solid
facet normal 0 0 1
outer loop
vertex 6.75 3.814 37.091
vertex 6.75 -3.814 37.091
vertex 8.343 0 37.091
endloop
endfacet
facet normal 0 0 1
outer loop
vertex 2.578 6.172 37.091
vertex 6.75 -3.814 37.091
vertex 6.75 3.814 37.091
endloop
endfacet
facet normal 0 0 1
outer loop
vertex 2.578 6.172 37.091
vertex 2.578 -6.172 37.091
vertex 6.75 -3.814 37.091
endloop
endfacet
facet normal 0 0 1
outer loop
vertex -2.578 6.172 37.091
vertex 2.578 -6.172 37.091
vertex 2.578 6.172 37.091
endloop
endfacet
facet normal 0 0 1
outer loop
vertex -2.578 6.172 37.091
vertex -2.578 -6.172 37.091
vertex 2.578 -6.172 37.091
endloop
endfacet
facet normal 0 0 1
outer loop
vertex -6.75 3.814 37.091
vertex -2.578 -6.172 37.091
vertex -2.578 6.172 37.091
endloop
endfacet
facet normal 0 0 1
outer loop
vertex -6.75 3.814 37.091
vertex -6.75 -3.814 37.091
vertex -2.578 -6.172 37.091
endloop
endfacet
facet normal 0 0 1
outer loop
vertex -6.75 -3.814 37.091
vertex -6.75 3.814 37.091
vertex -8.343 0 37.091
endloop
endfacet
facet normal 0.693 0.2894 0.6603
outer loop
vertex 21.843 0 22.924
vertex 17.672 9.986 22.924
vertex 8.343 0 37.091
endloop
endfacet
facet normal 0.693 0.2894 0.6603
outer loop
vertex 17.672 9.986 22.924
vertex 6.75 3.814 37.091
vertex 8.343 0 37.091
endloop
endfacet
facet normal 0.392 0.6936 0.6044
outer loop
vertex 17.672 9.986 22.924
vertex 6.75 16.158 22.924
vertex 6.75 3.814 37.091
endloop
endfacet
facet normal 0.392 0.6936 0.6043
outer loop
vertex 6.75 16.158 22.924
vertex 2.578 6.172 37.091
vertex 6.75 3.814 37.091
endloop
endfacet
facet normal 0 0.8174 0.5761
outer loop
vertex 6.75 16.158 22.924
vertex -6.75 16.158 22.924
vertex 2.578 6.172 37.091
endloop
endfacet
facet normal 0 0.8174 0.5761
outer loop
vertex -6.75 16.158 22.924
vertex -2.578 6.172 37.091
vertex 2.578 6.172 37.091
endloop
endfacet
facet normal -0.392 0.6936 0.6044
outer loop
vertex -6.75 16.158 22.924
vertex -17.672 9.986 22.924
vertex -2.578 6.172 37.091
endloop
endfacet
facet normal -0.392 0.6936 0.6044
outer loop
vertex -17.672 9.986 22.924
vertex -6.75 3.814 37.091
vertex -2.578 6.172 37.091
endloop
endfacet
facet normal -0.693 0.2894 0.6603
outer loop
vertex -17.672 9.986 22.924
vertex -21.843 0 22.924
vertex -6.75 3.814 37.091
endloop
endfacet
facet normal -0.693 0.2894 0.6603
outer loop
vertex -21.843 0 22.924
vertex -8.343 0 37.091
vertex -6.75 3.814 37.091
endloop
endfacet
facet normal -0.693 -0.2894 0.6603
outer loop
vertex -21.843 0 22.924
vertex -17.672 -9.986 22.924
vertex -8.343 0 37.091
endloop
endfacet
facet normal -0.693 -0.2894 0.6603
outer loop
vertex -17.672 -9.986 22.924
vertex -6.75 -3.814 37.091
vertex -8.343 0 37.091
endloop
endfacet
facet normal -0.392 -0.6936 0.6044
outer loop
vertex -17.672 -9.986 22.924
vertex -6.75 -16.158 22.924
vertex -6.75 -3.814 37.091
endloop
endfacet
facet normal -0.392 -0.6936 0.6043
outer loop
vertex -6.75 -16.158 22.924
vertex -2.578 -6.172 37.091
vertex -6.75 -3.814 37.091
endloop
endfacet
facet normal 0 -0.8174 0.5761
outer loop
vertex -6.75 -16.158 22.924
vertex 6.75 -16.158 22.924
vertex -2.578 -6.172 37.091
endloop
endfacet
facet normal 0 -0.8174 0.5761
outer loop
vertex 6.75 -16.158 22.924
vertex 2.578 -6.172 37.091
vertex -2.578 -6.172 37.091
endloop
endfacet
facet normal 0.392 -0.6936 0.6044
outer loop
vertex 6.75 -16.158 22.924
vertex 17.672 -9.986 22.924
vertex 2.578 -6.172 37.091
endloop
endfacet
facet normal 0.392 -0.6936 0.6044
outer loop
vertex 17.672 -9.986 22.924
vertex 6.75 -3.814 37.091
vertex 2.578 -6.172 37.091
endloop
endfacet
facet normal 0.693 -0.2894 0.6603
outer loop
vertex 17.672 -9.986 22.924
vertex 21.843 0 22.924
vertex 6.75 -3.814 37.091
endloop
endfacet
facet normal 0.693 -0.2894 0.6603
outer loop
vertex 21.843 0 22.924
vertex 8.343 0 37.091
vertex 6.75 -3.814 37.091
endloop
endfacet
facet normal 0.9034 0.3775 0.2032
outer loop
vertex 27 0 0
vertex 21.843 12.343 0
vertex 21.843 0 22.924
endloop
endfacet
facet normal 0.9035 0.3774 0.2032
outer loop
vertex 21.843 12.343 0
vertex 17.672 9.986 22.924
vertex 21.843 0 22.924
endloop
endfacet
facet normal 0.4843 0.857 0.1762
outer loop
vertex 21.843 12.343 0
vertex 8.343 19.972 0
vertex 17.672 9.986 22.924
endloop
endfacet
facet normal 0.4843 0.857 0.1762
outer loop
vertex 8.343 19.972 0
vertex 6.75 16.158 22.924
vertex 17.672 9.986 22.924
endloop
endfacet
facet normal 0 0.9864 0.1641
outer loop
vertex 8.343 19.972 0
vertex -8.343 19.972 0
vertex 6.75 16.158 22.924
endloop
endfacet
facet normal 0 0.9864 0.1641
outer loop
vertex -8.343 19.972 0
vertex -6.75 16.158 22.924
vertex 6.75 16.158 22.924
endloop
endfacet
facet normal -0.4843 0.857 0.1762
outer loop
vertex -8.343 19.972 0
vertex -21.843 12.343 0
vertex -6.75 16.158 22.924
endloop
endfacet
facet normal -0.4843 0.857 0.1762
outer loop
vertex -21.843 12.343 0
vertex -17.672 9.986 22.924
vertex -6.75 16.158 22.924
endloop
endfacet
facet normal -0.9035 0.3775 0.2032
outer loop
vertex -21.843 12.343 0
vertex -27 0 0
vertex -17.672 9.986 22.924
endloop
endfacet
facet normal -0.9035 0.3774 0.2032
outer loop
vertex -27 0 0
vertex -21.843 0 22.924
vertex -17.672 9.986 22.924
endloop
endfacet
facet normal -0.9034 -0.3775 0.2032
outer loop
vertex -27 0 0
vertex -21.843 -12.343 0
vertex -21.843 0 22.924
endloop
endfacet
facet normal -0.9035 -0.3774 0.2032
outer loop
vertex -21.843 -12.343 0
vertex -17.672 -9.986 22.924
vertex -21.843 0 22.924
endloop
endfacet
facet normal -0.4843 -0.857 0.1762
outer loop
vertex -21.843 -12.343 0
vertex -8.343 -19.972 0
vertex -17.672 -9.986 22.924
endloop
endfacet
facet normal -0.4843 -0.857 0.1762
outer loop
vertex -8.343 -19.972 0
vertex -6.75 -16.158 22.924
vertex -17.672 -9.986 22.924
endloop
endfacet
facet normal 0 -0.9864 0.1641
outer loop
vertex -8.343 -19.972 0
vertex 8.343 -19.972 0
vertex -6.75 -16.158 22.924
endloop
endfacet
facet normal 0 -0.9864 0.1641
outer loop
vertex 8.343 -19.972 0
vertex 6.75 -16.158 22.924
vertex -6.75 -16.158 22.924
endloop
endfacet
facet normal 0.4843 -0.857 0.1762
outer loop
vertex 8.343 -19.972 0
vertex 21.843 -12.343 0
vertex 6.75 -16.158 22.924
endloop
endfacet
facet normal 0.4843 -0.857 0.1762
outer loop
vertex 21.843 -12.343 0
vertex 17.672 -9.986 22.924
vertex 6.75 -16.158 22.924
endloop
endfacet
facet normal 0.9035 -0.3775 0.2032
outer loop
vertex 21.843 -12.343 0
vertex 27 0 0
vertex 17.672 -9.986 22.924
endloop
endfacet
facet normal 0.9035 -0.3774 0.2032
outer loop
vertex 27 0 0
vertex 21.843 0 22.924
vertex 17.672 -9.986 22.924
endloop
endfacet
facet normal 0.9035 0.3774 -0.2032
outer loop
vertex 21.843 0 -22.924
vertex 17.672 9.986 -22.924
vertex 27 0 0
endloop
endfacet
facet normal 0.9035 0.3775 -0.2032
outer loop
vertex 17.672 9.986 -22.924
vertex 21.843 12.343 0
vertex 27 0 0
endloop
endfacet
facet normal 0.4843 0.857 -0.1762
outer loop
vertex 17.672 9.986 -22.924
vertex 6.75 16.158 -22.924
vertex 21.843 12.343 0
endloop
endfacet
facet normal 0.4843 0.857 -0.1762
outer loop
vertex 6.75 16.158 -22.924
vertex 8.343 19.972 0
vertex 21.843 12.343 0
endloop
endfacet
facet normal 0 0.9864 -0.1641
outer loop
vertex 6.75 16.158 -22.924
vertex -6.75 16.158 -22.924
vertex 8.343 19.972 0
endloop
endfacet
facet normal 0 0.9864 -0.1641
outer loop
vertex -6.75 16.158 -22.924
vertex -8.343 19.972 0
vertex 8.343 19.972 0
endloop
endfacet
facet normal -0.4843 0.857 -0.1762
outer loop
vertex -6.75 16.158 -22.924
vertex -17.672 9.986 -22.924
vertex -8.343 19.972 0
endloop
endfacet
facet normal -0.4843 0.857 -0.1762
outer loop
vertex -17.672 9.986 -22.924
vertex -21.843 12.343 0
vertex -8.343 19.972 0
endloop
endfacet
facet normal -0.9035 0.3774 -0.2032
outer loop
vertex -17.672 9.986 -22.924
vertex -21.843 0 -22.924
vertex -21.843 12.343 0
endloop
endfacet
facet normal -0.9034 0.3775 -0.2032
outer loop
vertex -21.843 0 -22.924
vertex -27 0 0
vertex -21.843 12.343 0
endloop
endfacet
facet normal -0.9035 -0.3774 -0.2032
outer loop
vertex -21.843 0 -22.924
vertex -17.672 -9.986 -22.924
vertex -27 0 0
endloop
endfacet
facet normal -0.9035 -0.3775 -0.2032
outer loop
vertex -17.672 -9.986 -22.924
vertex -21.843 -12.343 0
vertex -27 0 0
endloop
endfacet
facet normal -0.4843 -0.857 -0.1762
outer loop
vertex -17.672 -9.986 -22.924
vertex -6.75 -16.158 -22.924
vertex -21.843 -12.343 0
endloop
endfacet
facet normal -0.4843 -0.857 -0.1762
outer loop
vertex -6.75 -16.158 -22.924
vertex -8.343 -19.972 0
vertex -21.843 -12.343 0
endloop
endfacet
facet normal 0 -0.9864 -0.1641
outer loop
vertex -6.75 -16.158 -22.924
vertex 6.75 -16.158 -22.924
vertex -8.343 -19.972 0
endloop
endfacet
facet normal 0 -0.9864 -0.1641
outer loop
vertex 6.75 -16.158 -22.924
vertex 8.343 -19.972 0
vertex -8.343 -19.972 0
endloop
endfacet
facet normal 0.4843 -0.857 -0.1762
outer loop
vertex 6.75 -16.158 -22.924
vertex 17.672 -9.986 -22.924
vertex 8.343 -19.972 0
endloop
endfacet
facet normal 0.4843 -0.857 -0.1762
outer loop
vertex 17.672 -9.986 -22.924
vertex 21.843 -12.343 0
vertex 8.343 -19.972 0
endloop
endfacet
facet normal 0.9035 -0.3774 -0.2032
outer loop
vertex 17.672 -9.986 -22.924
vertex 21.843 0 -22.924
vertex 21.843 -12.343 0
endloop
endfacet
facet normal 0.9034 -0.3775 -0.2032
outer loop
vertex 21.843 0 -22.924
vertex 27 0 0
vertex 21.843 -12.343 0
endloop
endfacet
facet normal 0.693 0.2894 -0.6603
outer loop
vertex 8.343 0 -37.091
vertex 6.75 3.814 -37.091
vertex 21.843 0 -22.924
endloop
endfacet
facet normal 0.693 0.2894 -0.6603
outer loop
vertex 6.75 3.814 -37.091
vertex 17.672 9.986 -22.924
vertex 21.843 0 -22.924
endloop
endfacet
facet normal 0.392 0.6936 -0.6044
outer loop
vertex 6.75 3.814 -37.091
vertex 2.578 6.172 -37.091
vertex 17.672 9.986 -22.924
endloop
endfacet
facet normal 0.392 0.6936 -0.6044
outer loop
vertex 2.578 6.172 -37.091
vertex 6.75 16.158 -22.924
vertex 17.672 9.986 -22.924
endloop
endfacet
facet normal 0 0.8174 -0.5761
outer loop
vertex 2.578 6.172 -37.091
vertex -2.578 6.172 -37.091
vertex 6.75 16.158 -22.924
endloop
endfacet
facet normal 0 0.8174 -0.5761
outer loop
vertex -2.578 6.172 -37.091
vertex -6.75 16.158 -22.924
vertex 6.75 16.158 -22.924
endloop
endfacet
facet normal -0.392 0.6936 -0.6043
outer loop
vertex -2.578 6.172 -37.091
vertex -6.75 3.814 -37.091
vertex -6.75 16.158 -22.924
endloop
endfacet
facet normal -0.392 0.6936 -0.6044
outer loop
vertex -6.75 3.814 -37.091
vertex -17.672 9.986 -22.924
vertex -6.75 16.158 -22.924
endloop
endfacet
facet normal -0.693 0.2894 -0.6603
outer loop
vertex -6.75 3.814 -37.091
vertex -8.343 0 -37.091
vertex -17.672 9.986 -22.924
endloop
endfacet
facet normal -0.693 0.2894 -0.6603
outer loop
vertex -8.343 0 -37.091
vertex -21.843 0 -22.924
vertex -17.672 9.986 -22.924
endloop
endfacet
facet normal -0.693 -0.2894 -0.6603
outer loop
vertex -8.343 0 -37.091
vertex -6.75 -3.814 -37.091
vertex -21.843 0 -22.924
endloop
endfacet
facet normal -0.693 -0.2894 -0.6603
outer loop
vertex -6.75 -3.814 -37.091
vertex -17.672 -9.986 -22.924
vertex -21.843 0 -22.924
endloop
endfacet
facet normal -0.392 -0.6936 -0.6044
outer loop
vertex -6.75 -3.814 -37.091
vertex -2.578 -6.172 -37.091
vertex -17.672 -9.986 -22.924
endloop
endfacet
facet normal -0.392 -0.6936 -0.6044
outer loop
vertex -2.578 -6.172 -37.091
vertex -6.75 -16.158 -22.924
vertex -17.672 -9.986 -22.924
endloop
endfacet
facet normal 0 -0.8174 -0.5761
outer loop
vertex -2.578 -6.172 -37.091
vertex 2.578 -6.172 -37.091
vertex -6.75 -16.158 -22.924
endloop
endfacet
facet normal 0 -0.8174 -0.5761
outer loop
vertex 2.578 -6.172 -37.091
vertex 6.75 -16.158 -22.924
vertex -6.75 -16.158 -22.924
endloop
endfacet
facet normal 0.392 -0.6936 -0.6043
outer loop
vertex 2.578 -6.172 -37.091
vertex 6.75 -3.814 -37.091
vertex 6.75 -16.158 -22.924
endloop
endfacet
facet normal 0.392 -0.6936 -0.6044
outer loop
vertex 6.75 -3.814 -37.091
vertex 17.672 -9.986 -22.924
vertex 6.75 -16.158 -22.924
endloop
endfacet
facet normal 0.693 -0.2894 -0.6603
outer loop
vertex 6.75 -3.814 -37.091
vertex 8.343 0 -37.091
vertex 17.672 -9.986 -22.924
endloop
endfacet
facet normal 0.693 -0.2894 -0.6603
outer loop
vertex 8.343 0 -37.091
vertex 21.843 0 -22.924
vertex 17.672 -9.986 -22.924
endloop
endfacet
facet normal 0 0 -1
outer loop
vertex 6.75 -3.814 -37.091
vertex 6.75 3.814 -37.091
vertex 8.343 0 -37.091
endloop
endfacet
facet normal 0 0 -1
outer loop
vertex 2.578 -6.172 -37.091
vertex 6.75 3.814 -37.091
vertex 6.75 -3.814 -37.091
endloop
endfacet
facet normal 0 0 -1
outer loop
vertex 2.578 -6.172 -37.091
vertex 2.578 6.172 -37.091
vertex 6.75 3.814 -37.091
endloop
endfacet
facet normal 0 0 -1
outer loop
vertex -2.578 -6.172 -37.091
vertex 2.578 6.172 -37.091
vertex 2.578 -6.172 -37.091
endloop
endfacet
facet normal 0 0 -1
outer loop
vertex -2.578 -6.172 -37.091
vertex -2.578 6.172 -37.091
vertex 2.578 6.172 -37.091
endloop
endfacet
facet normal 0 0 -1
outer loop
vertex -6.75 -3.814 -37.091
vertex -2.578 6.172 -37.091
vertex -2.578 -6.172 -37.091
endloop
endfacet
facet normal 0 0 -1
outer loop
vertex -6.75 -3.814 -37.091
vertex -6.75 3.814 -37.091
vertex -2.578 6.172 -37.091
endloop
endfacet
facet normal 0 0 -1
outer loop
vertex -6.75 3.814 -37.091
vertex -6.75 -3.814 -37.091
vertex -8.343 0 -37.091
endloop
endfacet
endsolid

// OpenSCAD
// Generated by SolidPython 1.0.1 on 2020-07-29 00:46:48


scale(v = [9, 7, 13]) {
	sphere(r = 3);
}
/***********************************************
*********      SolidPython code:      **********
************************************************
 
# import packages: SolidPython
from solid import *
from solid.utils import *
from itertools import chain, combinations, permutations


class Resize:

    def __init__(self, scad_file):
        self.scad_file = scad_file
        #self.scad_file = import_scad(scad_file)
        # cone/cylinder param:
        self.r1 = 0
        self.r2 = 0
        self.h = 0
        # rectangular prism param:
        self.w = 0
        self.l = 0
        # ellipse param:
        self.r = 0

    # import OpenScad code (file name corresponds to shape)


    # classify shape + parameters
    def assign(self, param1, param2, param3):
        if self.scad_file == 'cone.scad':
            self.r1 = param1
            self.r2 = param2
            self.h = param3
        elif self.scad_file == 'cylinder.scad':
            self.r1 = param1
            self.r2 = param2
            self.h = param3
        elif self.scad_file == 'rectangularPrism.scad':
            self.h = param1
            self.l = param2
            self.w = param3
        else:
            self.r = param1
            self.h = param2

    # resize parameters
    def iterate(self):
        x = range(3, 20, 2)
        i = 1
        if self.scad_file == 'cone.scad':
            tempList = list(permutations(x, 2))
            for temp in tempList:
                param1 = temp[0]
                param2 = temp[1]
                filepath = 'produced_scad_files/' + 'cone' + str(param1) + '_' + str(param2) + '_' + '.scad'
                scad_render_to_file(cylinder(h=param1, r1=param2, r2=0), filepath)

        elif self.scad_file == 'cylinder.scad':
            tempList = list(permutations(x, 3))
            for temp in tempList:
                param1 = temp[0]
                param2 = temp[1]
                filepath = 'produced_scad_files/' + 'cylinder' + str(param1) + '_' + str(param2) + '_' + '.scad'
                scad_render_to_file(cylinder(h=param1, r1=param2, r2=param2), filepath)

        elif self.scad_file == 'rectangularPrism.scad':
            tempList = list(permutations(x, 3))
            for temp in tempList:
                param1 = temp[0]
                param2 = temp[1]
                param3 = temp[2]
                filepath = 'produced_scad_files/' + 'rectangularPrism' + str(param1) + '_' + str(param2) + '_' + str(
                    param3) + '.scad'
                scad_render_to_file(cube(size=(param1, param2, param3)), filepath)

        elif self.scad_file == 'ellipse.scad':
            tempList = list(permutations(x, 4))
            for temp in tempList:
                param1 = temp[0]
                param2 = temp[1]
                param3 = temp[2]
                param4 = temp[3]
                filepath = 'produced_scad_files/' + 'ellipse' + str(param1) + '_' + str(param2) + '_' + str(param3) + '_' + str(param4) + '.scad'
                scad_render_to_file(scale([param1, param2, param3])(sphere(r=param4)), filepath)

    def render_to_scadfile(self):
        scad_render_to_file(scad, 'example.scad') 
 
************************************************/
